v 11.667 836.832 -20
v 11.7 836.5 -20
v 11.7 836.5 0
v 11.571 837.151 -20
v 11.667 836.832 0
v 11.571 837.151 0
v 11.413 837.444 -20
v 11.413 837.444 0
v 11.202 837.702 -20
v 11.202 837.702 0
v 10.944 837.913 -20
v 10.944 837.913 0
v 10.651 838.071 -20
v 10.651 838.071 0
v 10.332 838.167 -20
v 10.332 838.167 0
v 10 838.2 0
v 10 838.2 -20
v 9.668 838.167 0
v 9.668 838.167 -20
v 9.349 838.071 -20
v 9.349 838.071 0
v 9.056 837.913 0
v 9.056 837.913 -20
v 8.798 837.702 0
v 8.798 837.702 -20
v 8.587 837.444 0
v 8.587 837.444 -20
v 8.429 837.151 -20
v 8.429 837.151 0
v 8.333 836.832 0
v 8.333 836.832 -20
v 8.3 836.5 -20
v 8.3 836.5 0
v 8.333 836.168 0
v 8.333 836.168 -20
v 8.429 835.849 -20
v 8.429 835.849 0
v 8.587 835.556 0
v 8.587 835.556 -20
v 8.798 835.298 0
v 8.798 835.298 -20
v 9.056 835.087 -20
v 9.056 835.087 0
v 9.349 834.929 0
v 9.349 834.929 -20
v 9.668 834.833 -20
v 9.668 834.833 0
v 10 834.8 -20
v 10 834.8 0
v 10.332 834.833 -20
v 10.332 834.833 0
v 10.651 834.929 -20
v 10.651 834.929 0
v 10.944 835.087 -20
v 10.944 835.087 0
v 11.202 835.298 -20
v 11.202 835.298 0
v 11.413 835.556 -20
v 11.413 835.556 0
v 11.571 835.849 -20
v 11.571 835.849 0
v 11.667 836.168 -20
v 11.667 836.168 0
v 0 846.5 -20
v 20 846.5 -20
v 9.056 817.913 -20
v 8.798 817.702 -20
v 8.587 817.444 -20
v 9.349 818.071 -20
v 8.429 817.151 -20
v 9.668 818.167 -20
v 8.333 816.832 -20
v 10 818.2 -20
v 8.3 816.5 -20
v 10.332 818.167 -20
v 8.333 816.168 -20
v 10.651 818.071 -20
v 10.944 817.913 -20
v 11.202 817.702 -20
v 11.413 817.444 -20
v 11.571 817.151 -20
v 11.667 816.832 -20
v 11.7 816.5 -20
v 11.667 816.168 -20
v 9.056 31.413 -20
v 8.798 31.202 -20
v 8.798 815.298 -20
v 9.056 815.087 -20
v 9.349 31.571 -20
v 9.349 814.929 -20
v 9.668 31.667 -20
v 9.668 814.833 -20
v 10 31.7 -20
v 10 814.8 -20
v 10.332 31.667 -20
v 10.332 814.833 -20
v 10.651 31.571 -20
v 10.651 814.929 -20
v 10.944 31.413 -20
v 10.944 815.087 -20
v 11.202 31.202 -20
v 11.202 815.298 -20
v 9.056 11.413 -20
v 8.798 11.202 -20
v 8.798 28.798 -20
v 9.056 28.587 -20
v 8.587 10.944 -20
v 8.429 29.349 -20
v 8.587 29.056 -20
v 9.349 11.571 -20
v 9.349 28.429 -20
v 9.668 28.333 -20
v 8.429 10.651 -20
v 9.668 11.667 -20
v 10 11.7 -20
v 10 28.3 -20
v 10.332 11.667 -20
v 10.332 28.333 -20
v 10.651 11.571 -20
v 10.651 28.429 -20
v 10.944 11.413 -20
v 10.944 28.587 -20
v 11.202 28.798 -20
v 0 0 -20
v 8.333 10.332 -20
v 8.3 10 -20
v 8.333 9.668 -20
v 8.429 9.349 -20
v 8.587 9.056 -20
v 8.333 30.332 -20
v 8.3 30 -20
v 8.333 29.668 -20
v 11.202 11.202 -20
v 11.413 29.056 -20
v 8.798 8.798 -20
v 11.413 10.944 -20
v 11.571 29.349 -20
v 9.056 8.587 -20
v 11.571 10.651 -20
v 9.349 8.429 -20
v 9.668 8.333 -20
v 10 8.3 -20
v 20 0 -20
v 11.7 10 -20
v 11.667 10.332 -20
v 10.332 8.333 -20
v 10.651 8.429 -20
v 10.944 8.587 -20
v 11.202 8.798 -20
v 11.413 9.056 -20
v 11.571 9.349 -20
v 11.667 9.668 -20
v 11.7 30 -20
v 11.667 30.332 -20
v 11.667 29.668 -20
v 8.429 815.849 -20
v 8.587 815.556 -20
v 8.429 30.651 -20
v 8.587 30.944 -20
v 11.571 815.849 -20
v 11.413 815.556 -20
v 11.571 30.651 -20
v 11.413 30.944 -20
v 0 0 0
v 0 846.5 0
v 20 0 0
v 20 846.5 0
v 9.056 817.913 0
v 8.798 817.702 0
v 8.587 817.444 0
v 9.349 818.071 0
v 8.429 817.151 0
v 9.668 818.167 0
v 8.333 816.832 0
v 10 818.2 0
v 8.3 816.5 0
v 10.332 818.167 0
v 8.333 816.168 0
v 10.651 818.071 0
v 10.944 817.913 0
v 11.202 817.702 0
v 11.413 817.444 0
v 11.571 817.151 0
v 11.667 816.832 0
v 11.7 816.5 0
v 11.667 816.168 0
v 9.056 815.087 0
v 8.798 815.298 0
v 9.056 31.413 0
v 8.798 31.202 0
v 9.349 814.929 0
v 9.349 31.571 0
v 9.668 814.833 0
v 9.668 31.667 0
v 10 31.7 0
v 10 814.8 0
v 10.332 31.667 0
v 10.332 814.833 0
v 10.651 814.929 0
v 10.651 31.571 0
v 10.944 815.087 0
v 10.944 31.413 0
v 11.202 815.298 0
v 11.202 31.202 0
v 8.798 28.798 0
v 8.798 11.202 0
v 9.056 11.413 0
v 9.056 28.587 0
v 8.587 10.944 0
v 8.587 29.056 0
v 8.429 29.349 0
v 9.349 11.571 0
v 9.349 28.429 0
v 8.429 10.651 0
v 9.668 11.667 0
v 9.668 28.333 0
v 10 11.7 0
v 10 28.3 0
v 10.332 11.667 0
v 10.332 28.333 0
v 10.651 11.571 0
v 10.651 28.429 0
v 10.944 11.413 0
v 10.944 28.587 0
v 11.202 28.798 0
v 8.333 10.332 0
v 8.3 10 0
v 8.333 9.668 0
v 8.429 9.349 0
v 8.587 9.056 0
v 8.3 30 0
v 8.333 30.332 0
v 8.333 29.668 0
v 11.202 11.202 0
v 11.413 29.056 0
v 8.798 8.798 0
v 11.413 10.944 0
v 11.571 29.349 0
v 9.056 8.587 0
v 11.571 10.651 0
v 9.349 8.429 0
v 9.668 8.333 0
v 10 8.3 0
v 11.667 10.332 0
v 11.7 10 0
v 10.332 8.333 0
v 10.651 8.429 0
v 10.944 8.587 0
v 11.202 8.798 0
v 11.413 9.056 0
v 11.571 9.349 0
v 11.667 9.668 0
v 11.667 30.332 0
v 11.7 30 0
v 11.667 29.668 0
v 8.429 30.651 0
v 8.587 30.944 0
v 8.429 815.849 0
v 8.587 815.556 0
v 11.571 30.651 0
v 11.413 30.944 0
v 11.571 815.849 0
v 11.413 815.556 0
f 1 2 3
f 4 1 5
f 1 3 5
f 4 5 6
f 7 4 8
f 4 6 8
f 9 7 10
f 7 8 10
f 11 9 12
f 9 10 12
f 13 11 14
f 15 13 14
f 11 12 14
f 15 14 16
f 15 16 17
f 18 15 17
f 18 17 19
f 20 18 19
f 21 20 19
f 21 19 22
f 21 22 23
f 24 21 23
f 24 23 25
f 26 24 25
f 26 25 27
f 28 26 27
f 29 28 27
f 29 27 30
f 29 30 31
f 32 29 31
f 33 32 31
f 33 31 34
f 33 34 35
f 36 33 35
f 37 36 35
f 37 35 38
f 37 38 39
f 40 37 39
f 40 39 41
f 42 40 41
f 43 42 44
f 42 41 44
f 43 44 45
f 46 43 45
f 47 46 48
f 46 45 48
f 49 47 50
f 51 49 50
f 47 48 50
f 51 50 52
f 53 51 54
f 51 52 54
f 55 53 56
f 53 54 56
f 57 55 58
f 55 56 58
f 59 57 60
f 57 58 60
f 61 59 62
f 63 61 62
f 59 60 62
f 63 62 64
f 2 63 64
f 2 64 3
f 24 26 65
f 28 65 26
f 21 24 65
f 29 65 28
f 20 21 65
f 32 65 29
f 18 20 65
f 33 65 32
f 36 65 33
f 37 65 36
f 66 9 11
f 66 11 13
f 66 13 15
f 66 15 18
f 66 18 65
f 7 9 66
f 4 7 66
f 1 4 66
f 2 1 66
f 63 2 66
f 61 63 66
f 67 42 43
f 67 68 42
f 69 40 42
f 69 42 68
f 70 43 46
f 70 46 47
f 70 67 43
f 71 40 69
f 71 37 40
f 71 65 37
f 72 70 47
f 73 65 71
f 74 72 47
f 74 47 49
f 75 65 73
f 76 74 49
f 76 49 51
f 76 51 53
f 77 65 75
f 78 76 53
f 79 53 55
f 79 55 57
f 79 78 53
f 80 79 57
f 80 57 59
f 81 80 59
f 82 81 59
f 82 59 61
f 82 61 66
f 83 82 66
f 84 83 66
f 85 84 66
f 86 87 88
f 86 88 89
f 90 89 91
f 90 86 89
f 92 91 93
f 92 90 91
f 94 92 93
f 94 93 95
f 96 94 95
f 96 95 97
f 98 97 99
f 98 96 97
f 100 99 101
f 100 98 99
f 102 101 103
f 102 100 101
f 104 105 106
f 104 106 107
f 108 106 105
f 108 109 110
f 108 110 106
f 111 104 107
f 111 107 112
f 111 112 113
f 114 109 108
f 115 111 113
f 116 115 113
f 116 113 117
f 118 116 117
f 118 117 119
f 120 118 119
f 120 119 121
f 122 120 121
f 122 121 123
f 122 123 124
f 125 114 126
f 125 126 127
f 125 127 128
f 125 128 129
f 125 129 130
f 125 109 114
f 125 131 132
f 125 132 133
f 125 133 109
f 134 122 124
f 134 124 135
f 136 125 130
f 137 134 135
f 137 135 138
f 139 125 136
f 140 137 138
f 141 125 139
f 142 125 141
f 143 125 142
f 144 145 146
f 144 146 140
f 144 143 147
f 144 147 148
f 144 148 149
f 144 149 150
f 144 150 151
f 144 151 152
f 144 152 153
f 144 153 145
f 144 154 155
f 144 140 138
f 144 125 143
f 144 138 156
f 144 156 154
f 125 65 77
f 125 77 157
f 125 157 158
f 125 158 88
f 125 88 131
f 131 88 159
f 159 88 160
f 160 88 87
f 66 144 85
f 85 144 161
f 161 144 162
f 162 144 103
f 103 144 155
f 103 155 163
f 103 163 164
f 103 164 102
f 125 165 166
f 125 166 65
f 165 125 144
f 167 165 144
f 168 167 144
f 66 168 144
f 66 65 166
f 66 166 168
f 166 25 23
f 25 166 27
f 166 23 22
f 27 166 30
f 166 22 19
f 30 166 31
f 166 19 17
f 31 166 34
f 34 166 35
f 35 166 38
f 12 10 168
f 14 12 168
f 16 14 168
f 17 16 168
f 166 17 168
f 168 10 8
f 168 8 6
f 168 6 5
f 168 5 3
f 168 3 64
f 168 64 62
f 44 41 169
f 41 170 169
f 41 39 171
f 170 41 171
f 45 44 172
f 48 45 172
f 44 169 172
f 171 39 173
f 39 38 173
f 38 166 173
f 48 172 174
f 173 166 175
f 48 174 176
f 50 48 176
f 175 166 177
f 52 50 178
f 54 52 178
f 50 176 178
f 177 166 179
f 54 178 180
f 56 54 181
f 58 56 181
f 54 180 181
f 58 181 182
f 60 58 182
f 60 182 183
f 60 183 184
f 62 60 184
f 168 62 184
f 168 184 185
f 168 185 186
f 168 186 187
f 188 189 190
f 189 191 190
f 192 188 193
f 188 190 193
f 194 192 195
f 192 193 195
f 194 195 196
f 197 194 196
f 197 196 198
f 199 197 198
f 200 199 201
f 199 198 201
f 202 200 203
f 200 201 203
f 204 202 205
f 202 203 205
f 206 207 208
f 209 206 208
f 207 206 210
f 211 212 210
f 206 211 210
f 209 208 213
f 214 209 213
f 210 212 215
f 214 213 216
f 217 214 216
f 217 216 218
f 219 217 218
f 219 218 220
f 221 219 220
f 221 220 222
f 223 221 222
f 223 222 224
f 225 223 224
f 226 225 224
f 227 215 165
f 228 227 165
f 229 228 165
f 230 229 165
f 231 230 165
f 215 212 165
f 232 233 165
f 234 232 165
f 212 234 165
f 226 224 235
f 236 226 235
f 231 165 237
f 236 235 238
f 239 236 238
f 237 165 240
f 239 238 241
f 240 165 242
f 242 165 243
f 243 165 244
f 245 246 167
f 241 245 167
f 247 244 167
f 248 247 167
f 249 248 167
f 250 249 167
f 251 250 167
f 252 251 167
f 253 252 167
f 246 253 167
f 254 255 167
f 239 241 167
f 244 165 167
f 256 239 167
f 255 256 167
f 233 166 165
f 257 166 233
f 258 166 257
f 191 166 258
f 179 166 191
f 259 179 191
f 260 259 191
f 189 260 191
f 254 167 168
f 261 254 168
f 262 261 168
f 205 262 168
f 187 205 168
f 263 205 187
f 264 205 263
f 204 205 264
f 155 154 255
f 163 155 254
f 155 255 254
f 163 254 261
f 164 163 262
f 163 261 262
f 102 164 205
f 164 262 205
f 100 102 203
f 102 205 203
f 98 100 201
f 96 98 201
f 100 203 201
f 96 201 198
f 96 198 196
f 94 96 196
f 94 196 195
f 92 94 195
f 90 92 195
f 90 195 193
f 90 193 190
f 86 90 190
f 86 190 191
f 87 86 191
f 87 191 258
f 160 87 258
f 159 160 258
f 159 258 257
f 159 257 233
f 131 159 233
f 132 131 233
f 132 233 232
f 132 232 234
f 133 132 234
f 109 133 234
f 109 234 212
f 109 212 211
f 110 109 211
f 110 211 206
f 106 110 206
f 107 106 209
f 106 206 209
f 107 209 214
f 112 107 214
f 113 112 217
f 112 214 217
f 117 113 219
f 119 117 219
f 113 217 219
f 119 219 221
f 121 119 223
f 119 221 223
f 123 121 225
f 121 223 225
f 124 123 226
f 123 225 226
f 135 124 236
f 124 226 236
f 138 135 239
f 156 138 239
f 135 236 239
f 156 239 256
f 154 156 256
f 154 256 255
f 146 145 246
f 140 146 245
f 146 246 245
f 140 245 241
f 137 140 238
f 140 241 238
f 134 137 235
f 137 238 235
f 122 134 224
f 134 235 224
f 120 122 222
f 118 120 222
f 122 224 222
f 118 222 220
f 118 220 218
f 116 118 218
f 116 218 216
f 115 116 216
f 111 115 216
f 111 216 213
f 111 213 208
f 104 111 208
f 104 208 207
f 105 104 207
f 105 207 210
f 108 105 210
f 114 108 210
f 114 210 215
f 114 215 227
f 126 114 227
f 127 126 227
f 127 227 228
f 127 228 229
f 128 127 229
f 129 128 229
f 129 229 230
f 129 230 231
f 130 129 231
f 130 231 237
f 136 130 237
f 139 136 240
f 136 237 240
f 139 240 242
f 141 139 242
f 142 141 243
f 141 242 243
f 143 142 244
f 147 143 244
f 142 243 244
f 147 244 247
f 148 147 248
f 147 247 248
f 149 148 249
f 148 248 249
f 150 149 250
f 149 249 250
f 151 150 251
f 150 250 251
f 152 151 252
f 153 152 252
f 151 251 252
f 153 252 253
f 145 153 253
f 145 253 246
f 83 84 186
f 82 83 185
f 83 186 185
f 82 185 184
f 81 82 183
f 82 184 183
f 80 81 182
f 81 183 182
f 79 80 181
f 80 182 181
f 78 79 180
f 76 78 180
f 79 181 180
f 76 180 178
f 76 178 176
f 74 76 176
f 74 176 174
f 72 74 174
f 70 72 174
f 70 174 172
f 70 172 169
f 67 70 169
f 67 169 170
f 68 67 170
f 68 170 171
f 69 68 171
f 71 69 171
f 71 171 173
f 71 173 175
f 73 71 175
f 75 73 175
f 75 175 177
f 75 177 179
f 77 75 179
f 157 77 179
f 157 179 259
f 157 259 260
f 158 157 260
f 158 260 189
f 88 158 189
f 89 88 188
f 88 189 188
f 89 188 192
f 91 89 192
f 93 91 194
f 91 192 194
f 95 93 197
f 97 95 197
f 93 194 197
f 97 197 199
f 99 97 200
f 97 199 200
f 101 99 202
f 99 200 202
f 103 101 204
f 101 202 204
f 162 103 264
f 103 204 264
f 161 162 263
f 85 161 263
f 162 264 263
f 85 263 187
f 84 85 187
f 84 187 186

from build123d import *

# Parameters (mm, degrees)
SKETCH_1_W          = 20
SKETCH_1_H          = 20
EXTRUDE_1_DEPTH     = 846.5
SKETCH_2_R          = 1.7
CUT_EXTRUDE_1_DEPTH = 847.972402148


with BuildPart() as part:
    # 草图1 → 凸台-拉伸1 (new body)
    with BuildSketch(Plane(origin=(0, 0, 0), x_dir=(1, 0, 0), z_dir=(0, 1, 0))):
        with Locations((10, 10)):
            Rectangle(SKETCH_1_W, SKETCH_1_H)
    extrude(amount=EXTRUDE_1_DEPTH)

    # 草图2 → 切除-拉伸1 (cut, through all)
    with BuildSketch(Plane.XY):
        with Locations((10, 10)):
            Circle(SKETCH_2_R)
        with Locations((10, 30)):
            Circle(SKETCH_2_R)
        with Locations((10, 836.5)):
            Circle(SKETCH_2_R)
        with Locations((10, 816.5)):
            Circle(SKETCH_2_R)
    extrude(amount=-CUT_EXTRUDE_1_DEPTH, mode=Mode.SUBTRACT)


solid = part.part
